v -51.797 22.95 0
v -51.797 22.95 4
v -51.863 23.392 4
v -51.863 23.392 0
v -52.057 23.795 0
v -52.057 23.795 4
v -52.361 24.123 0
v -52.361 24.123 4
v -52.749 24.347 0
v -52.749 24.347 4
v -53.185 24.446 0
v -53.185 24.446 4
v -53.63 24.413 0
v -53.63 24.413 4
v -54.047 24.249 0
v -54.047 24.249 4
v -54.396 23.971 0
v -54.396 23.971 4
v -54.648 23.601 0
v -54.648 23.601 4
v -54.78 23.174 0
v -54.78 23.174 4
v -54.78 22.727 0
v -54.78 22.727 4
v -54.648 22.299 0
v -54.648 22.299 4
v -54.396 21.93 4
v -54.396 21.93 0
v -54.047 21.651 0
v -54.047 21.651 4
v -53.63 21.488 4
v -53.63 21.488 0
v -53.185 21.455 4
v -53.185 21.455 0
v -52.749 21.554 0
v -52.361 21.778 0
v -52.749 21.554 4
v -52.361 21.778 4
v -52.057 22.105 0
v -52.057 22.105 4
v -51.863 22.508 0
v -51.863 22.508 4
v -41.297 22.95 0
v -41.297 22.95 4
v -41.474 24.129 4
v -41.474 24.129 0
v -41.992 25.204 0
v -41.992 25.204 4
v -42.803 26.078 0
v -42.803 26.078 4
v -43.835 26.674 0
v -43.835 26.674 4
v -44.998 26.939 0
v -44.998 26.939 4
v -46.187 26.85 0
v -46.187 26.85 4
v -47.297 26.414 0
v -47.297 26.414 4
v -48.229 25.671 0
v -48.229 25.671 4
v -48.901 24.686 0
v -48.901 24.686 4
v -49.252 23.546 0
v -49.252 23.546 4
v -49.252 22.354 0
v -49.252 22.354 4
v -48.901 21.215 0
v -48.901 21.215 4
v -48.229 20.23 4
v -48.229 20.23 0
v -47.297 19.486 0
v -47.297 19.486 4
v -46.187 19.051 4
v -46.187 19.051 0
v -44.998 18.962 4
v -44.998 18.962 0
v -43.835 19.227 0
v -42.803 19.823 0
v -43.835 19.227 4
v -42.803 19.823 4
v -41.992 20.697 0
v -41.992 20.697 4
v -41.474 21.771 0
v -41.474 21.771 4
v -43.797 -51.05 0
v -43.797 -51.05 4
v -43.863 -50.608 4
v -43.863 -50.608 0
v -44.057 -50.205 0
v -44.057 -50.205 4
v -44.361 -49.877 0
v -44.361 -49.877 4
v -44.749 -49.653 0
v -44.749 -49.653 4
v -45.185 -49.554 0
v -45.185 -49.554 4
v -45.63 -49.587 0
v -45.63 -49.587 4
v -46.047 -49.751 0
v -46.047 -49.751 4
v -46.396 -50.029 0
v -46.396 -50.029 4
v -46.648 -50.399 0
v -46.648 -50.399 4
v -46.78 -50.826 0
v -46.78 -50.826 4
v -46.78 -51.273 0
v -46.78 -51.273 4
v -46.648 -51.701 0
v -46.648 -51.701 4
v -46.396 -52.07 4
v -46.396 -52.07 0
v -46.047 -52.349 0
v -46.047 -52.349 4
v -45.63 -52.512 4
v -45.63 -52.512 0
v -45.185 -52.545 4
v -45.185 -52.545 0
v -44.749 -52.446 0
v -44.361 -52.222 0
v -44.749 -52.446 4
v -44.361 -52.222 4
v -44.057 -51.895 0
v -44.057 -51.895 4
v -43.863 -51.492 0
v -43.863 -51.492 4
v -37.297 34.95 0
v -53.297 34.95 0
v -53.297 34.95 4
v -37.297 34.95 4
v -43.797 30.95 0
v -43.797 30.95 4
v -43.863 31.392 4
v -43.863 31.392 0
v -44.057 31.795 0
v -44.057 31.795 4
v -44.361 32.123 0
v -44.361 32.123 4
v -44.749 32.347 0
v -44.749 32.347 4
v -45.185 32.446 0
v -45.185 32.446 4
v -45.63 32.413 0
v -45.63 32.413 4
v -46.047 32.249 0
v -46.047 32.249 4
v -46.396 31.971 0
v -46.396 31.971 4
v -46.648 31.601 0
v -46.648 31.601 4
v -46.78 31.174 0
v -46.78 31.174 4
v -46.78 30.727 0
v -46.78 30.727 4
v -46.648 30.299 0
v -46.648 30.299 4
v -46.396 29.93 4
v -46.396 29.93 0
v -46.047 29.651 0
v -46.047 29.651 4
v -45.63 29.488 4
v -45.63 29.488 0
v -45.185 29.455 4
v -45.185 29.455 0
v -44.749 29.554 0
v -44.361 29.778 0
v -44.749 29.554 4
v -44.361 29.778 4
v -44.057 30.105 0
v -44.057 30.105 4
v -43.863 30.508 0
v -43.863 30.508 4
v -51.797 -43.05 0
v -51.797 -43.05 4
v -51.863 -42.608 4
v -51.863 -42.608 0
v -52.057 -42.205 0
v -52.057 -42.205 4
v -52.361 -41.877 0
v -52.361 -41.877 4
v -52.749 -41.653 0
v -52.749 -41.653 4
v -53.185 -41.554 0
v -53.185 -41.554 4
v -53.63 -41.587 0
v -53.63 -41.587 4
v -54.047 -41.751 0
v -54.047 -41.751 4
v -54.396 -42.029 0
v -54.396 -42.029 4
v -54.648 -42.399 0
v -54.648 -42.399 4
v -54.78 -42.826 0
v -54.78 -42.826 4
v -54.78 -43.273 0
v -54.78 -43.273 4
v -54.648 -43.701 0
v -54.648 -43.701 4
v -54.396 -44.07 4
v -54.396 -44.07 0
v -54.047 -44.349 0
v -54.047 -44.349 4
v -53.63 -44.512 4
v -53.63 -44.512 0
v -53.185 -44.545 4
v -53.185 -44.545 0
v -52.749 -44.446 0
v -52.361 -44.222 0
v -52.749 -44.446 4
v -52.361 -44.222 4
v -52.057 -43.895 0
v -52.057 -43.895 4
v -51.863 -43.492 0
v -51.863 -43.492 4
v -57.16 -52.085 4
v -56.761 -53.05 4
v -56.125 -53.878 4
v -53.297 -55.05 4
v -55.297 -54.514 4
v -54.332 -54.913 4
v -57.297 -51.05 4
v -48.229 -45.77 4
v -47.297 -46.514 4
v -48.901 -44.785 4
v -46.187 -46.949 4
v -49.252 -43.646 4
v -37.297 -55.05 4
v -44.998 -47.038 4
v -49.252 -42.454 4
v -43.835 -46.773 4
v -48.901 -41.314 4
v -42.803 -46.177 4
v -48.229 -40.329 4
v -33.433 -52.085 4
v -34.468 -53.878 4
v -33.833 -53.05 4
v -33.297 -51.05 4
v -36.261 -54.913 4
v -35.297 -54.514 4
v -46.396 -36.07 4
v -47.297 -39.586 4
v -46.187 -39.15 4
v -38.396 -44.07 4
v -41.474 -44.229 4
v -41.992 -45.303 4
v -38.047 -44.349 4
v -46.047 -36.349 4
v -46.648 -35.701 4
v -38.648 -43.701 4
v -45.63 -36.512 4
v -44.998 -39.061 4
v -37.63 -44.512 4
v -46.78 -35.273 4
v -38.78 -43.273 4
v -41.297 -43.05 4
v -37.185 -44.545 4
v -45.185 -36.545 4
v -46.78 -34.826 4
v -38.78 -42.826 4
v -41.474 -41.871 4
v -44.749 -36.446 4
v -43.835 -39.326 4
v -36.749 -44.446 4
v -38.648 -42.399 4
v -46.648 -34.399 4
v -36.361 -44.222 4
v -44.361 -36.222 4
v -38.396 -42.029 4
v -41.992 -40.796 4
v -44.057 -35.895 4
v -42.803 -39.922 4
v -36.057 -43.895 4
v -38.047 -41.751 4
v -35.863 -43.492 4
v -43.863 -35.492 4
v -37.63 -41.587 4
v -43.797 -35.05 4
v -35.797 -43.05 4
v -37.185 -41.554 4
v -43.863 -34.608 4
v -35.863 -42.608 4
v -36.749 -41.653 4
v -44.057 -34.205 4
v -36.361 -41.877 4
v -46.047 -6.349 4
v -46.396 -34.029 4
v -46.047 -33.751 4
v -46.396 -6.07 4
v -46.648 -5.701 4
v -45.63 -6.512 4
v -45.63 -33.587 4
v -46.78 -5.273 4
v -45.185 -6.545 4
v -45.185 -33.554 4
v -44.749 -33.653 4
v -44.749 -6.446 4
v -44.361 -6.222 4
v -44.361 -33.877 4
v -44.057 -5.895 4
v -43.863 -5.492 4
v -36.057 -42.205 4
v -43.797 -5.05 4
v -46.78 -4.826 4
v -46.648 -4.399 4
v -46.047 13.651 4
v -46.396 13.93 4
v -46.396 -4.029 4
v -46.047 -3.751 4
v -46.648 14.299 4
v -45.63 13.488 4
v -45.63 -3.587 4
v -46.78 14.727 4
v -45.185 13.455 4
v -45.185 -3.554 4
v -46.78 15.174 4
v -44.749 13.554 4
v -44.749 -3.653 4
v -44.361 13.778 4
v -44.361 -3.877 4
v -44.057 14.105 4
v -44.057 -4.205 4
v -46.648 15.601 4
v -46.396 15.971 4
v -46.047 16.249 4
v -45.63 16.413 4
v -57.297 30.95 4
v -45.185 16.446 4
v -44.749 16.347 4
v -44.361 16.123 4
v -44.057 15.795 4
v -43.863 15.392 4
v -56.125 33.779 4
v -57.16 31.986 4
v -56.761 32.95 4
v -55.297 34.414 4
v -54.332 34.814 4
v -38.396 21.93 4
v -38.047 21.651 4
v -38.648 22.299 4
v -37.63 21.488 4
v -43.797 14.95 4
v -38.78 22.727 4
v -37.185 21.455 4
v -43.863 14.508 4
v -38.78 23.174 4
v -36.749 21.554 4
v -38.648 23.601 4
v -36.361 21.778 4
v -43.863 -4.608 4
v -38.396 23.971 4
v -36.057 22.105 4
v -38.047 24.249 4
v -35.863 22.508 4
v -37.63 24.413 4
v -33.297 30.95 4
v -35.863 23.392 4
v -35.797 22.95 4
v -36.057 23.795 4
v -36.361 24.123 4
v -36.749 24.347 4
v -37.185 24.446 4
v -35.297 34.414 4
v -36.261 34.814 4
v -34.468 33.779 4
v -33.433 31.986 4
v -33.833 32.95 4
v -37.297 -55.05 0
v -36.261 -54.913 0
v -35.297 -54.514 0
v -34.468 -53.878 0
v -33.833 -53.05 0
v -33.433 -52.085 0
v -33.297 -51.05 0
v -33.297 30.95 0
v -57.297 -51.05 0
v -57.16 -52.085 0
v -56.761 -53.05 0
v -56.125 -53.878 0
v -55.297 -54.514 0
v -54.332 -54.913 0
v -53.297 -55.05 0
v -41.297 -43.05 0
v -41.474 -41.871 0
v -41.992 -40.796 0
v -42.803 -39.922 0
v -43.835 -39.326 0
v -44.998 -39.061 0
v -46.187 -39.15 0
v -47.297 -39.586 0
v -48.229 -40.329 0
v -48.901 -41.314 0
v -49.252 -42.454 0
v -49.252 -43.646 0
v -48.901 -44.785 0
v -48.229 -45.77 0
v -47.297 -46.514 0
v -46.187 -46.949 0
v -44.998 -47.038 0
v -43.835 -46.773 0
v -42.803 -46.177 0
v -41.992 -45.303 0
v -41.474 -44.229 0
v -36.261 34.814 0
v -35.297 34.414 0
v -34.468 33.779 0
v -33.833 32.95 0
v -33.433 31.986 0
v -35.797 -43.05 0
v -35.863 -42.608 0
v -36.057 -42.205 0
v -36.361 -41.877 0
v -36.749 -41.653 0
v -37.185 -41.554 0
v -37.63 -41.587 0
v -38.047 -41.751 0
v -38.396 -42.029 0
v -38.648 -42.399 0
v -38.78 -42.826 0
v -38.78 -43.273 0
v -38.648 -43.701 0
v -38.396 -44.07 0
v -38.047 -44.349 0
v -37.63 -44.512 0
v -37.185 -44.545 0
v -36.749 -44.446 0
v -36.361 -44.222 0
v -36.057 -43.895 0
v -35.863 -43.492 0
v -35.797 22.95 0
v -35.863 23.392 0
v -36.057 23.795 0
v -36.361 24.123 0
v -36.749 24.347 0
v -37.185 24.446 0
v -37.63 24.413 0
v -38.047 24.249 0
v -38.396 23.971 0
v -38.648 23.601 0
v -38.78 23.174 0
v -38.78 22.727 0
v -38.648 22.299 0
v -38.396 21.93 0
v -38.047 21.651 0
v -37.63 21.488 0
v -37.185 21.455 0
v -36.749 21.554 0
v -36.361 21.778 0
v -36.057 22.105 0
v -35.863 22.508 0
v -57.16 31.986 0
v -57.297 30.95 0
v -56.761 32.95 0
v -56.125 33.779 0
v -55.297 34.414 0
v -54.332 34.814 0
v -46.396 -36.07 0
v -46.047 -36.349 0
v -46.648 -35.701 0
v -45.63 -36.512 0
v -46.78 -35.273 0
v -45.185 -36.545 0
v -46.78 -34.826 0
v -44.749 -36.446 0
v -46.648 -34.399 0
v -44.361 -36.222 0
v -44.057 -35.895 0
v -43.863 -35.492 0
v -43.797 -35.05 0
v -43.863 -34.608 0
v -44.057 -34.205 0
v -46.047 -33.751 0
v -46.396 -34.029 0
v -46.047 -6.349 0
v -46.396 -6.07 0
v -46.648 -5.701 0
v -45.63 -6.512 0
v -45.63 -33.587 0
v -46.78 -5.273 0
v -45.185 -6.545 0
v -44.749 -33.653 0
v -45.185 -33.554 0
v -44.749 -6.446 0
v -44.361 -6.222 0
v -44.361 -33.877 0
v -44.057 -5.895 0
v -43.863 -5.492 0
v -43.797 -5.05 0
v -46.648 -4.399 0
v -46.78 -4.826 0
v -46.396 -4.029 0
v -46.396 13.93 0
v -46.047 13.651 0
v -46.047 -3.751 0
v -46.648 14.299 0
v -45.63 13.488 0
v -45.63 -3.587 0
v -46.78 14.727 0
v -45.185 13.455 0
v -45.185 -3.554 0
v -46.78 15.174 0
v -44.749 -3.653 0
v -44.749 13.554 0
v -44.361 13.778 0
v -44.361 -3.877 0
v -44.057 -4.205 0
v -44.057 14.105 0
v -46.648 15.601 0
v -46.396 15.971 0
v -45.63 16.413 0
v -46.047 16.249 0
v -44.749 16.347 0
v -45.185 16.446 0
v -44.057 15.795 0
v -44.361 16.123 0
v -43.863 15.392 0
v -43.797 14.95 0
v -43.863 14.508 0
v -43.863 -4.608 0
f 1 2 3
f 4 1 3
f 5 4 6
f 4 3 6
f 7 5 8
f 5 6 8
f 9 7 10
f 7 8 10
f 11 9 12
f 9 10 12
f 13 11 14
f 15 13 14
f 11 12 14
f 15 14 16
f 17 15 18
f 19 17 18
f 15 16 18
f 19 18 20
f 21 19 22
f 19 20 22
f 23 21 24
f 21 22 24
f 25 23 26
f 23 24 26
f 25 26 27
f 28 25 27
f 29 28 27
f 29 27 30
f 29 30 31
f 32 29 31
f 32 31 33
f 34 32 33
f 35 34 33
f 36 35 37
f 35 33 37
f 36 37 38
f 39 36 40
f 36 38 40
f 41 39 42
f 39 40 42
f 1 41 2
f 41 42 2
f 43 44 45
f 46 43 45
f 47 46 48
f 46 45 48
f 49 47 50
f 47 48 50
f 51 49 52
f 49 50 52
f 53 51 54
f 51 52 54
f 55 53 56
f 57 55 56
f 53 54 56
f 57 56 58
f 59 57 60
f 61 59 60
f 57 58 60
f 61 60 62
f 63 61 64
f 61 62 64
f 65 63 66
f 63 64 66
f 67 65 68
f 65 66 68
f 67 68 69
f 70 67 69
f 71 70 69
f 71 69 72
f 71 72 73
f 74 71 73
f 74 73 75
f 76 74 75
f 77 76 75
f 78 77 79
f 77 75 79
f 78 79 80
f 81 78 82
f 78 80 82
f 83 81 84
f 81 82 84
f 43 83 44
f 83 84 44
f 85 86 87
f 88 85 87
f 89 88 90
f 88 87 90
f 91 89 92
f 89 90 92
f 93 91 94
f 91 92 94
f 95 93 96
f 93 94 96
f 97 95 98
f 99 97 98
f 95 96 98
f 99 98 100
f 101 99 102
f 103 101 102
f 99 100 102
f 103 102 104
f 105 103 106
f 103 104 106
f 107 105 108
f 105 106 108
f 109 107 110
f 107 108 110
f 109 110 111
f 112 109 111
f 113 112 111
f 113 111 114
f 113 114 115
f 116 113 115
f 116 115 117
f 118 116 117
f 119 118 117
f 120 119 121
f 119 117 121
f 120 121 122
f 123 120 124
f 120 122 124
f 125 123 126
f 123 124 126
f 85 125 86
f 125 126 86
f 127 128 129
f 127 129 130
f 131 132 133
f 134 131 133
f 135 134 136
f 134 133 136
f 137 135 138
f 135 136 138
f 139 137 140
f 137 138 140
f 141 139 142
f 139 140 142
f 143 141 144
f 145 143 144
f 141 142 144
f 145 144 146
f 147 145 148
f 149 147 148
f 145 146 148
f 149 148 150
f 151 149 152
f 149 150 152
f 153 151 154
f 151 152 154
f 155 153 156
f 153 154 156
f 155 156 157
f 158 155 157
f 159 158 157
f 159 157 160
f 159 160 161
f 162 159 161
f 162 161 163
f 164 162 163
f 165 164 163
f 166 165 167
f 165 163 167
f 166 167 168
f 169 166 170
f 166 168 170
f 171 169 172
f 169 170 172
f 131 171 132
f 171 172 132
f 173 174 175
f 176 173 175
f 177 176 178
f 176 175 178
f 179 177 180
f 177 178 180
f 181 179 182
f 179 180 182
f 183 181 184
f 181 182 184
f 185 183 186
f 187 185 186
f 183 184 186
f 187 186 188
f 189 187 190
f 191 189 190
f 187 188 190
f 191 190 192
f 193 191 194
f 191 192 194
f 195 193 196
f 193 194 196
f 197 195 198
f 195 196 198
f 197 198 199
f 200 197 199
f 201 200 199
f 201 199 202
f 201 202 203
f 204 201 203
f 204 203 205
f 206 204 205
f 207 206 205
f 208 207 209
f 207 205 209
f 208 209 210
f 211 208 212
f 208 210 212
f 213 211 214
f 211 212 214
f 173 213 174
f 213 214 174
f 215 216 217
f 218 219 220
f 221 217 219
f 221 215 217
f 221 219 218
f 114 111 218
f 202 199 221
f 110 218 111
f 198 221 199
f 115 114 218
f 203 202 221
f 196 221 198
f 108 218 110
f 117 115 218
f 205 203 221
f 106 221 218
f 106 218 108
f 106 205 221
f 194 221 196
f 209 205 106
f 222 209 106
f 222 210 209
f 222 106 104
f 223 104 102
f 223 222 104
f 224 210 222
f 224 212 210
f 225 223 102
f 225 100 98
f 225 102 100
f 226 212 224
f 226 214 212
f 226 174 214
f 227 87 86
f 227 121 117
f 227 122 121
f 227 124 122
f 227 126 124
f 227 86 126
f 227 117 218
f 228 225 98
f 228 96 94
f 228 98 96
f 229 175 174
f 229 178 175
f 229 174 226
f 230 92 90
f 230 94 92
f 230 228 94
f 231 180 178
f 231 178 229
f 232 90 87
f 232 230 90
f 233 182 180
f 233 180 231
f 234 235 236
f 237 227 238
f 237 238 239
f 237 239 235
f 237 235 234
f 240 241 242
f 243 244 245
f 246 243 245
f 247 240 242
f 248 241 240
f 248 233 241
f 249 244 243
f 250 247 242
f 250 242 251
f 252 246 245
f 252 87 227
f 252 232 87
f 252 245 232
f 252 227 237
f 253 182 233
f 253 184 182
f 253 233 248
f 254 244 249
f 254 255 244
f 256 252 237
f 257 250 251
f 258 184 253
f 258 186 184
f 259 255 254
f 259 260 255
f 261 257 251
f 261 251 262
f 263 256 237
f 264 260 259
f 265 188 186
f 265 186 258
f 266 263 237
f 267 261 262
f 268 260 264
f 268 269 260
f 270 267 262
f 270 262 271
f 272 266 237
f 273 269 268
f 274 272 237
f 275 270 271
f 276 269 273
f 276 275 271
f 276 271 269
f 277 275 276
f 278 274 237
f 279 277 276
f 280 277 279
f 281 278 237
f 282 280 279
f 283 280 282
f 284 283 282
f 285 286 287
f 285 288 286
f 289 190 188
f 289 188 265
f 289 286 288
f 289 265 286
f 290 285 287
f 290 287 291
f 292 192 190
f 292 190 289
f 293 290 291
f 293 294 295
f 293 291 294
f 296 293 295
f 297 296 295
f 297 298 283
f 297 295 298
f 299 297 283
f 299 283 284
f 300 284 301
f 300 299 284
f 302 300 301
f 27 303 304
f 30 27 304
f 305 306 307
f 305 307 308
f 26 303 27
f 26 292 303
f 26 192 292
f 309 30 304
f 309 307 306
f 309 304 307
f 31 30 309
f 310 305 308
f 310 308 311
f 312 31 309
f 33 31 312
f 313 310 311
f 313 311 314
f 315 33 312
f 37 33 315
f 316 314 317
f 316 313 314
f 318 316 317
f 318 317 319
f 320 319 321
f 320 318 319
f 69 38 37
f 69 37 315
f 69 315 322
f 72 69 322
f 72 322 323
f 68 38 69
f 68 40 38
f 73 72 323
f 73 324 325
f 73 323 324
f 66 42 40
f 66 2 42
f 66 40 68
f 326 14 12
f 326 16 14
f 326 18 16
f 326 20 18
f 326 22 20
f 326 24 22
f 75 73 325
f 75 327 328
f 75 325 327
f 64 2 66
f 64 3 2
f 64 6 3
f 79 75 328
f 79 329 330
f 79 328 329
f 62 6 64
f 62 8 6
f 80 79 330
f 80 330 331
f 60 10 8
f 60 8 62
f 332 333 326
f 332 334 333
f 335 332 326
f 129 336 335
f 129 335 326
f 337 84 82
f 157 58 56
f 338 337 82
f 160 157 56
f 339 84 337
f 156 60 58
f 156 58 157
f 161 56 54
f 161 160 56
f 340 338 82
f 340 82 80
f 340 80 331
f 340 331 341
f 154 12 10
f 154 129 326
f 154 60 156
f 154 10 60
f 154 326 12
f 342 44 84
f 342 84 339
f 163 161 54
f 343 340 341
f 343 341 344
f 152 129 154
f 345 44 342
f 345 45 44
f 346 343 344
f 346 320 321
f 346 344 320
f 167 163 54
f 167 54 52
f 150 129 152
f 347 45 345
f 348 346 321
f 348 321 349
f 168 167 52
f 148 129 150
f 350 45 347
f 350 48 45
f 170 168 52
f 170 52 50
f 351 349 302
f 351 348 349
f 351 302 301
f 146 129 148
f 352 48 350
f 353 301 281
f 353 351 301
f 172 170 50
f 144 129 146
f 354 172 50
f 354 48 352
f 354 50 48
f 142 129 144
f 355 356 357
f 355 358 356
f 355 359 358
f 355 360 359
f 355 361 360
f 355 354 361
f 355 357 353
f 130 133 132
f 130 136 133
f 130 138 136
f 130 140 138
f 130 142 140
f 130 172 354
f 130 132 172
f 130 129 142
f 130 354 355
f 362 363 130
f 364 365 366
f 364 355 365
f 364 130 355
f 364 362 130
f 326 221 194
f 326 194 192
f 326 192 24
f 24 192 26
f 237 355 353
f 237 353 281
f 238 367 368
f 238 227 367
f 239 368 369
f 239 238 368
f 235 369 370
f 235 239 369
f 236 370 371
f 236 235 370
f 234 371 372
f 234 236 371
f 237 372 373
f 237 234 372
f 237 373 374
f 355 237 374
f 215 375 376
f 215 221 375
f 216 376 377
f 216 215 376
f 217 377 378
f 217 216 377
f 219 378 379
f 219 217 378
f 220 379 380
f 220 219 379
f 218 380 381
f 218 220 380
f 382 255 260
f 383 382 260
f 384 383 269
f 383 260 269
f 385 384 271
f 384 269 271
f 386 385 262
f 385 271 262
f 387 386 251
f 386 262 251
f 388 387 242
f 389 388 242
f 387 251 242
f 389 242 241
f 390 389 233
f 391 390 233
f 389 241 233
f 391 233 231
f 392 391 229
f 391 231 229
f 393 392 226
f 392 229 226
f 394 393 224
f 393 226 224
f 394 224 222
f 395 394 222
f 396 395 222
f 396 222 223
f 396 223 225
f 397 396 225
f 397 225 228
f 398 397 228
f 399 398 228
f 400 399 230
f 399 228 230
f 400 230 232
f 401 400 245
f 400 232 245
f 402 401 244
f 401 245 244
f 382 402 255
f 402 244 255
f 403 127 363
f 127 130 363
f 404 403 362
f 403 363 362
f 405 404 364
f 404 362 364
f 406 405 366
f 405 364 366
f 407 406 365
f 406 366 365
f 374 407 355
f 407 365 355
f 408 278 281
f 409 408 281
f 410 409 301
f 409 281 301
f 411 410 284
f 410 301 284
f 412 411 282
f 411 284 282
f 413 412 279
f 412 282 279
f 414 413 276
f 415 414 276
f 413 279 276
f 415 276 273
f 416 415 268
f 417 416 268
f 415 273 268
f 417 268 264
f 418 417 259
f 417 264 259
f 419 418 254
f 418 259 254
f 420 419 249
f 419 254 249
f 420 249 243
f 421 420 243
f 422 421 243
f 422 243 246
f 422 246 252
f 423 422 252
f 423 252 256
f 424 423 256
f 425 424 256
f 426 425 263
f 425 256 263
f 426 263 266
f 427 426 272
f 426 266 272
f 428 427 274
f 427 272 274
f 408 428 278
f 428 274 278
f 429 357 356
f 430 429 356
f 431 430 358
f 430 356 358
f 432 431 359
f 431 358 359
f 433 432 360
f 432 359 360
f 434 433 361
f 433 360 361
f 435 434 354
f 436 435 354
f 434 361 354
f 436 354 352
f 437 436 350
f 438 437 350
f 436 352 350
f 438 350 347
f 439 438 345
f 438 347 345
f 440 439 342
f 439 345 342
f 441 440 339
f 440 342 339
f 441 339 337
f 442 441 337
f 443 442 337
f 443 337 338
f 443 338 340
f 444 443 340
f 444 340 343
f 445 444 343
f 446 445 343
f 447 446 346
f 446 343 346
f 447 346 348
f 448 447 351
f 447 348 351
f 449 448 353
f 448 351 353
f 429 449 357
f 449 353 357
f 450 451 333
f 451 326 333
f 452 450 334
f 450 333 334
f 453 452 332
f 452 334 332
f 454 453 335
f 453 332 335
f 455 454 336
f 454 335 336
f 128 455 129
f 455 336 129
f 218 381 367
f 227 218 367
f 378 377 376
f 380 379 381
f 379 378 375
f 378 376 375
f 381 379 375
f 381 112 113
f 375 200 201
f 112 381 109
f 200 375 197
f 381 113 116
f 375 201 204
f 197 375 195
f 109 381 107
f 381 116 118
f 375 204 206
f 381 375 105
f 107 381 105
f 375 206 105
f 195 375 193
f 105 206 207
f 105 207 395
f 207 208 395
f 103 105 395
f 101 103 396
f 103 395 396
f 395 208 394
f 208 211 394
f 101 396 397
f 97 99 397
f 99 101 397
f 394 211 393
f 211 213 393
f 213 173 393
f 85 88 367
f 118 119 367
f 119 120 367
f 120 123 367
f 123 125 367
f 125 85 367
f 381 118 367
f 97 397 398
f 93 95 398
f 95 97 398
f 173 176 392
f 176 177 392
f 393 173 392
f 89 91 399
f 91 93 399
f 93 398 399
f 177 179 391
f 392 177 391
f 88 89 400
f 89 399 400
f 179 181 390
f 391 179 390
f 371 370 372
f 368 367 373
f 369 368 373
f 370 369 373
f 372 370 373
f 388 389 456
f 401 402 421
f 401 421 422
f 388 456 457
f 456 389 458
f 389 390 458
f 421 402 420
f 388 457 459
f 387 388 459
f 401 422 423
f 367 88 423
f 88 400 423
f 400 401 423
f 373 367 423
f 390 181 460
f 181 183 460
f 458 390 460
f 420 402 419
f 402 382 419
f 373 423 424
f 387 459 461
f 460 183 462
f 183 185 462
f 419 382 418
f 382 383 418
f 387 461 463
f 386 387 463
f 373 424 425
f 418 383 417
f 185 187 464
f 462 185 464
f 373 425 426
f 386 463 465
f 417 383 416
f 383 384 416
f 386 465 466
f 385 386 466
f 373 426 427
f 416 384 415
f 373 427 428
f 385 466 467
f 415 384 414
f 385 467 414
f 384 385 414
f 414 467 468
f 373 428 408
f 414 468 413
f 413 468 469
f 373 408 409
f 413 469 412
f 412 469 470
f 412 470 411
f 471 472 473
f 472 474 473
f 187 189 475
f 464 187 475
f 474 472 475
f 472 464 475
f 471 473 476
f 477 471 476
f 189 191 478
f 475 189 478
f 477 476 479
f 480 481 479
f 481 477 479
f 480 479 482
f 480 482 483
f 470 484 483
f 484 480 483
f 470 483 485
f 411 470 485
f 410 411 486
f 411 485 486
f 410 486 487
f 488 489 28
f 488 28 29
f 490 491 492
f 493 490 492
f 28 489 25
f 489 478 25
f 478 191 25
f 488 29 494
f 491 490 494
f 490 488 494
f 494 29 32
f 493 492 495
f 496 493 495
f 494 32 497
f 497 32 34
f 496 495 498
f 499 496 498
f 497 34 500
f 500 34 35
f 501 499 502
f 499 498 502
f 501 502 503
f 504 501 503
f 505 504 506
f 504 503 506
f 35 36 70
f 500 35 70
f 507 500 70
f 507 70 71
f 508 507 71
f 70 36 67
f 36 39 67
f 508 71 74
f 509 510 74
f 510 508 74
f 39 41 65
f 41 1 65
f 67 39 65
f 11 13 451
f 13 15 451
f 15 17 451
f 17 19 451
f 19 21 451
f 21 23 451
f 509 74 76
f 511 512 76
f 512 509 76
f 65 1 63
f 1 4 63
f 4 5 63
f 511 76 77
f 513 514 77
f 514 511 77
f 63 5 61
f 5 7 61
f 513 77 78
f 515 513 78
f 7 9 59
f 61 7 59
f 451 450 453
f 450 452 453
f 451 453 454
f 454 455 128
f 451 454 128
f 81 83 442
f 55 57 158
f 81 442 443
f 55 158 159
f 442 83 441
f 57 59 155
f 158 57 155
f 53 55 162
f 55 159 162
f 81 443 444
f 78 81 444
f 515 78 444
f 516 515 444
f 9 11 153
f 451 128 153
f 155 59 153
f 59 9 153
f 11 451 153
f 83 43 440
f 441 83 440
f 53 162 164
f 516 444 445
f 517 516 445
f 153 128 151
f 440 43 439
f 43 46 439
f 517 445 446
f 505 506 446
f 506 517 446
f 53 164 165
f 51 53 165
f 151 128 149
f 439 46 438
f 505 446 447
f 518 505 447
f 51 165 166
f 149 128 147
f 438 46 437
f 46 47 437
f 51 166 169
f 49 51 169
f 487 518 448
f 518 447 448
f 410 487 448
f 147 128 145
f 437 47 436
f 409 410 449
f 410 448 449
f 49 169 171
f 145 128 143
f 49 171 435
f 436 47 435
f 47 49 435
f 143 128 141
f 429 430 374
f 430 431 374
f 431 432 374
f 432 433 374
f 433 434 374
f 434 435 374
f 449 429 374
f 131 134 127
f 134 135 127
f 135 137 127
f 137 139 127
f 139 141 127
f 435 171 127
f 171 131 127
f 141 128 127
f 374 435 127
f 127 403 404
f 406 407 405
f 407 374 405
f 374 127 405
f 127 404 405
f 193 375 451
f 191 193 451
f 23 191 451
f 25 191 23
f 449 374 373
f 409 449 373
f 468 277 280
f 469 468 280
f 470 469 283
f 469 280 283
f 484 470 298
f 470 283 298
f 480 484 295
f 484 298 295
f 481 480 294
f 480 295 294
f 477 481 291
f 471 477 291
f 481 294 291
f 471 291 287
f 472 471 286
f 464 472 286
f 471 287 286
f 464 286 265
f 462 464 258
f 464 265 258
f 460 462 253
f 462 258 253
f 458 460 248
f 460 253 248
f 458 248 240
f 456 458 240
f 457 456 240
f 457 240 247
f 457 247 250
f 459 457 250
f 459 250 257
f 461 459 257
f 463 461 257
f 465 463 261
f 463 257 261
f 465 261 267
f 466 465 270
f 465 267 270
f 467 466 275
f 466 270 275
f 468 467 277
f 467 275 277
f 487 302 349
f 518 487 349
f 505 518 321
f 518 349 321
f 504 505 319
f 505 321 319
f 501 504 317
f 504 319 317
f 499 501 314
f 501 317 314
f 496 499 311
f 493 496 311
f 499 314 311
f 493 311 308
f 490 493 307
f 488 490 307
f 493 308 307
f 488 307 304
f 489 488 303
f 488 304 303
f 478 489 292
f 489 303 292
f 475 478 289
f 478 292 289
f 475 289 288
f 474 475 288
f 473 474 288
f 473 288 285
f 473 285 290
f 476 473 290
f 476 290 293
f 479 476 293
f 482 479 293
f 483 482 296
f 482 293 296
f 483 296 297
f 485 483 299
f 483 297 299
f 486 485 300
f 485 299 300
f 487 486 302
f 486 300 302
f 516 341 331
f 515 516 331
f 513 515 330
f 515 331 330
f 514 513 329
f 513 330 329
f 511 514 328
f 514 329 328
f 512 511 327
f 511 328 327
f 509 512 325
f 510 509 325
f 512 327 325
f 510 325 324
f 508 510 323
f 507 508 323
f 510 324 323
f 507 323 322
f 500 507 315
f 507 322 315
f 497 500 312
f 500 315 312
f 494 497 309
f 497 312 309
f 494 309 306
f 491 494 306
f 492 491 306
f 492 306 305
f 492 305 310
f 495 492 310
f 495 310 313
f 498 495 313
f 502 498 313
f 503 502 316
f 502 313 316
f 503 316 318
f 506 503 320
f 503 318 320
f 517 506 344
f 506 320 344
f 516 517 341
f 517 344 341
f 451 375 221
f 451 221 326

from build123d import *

# Parameters (mm, degrees)
SKETCH1_W           = 24
SKETCH1_H           = 90
BOSS_EXTRUDE1_DEPTH = 4
SKETCH2_R           = 4
SKETCH2_R_2         = 1.5
CUT_EXTRUDE1_DEPTH  = 4
FILLET1_R           = 4
SKETCH3_R           = 1.5
CUT_EXTRUDE2_DEPTH  = 4


with BuildPart() as part:
    # Sketch1 → Boss-Extrude1 (new body)
    with BuildSketch(Plane.XY):
        with Locations((-45.296675466, -10.049681021)):
            Rectangle(SKETCH1_W, SKETCH1_H)
    extrude(amount=BOSS_EXTRUDE1_DEPTH)

    # Sketch2 → Cut-Extrude1 (cut)
    with BuildSketch(Plane.XY.offset(4)):
        with Locations((-45.296675466, -43.049681021)):
            Circle(SKETCH2_R)
        with Locations((-37.296675466, -43.049681021)):
            Circle(SKETCH2_R_2)
        with Locations((-45.296675466, -51.049681021)):
            Circle(SKETCH2_R_2)
        with Locations((-53.296675466, -43.049681021)):
            Circle(SKETCH2_R_2)
        with Locations((-45.296675466, -35.049681021)):
            Circle(SKETCH2_R_2)
        with Locations((-45.296675466, 30.950318979)):
            Circle(SKETCH2_R_2)
        with Locations((-37.296675466, 22.950318979)):
            Circle(SKETCH2_R_2)
        with Locations((-45.296675466, 14.950318979)):
            Circle(SKETCH2_R_2)
        with Locations((-53.296675466, 22.950318979)):
            Circle(SKETCH2_R_2)
        with Locations((-45.296675466, 22.950318979)):
            Circle(SKETCH2_R)
    extrude(amount=-CUT_EXTRUDE1_DEPTH, mode=Mode.SUBTRACT)

    # Fillet1
    fillet1_edges = [part.edges().sort_by_distance(p)[0] for p in [
        (-57.296675466, 34.950318979, 2),
        (-57.296675466, -55.049681021, 2),
        (-33.296675466, -55.049681021, 2),
        (-33.296675466, 34.950318979, 2),
    ]]
    fillet(fillet1_edges, radius=FILLET1_R)

    # Sketch3 → Cut-Extrude2 (cut)
    with BuildSketch(Plane.XY.offset(4)):
        with Locations((-45.296675466, -5.049681021)):
            Circle(SKETCH3_R)
    extrude(amount=-CUT_EXTRUDE2_DEPTH, mode=Mode.SUBTRACT)


solid = part.part
